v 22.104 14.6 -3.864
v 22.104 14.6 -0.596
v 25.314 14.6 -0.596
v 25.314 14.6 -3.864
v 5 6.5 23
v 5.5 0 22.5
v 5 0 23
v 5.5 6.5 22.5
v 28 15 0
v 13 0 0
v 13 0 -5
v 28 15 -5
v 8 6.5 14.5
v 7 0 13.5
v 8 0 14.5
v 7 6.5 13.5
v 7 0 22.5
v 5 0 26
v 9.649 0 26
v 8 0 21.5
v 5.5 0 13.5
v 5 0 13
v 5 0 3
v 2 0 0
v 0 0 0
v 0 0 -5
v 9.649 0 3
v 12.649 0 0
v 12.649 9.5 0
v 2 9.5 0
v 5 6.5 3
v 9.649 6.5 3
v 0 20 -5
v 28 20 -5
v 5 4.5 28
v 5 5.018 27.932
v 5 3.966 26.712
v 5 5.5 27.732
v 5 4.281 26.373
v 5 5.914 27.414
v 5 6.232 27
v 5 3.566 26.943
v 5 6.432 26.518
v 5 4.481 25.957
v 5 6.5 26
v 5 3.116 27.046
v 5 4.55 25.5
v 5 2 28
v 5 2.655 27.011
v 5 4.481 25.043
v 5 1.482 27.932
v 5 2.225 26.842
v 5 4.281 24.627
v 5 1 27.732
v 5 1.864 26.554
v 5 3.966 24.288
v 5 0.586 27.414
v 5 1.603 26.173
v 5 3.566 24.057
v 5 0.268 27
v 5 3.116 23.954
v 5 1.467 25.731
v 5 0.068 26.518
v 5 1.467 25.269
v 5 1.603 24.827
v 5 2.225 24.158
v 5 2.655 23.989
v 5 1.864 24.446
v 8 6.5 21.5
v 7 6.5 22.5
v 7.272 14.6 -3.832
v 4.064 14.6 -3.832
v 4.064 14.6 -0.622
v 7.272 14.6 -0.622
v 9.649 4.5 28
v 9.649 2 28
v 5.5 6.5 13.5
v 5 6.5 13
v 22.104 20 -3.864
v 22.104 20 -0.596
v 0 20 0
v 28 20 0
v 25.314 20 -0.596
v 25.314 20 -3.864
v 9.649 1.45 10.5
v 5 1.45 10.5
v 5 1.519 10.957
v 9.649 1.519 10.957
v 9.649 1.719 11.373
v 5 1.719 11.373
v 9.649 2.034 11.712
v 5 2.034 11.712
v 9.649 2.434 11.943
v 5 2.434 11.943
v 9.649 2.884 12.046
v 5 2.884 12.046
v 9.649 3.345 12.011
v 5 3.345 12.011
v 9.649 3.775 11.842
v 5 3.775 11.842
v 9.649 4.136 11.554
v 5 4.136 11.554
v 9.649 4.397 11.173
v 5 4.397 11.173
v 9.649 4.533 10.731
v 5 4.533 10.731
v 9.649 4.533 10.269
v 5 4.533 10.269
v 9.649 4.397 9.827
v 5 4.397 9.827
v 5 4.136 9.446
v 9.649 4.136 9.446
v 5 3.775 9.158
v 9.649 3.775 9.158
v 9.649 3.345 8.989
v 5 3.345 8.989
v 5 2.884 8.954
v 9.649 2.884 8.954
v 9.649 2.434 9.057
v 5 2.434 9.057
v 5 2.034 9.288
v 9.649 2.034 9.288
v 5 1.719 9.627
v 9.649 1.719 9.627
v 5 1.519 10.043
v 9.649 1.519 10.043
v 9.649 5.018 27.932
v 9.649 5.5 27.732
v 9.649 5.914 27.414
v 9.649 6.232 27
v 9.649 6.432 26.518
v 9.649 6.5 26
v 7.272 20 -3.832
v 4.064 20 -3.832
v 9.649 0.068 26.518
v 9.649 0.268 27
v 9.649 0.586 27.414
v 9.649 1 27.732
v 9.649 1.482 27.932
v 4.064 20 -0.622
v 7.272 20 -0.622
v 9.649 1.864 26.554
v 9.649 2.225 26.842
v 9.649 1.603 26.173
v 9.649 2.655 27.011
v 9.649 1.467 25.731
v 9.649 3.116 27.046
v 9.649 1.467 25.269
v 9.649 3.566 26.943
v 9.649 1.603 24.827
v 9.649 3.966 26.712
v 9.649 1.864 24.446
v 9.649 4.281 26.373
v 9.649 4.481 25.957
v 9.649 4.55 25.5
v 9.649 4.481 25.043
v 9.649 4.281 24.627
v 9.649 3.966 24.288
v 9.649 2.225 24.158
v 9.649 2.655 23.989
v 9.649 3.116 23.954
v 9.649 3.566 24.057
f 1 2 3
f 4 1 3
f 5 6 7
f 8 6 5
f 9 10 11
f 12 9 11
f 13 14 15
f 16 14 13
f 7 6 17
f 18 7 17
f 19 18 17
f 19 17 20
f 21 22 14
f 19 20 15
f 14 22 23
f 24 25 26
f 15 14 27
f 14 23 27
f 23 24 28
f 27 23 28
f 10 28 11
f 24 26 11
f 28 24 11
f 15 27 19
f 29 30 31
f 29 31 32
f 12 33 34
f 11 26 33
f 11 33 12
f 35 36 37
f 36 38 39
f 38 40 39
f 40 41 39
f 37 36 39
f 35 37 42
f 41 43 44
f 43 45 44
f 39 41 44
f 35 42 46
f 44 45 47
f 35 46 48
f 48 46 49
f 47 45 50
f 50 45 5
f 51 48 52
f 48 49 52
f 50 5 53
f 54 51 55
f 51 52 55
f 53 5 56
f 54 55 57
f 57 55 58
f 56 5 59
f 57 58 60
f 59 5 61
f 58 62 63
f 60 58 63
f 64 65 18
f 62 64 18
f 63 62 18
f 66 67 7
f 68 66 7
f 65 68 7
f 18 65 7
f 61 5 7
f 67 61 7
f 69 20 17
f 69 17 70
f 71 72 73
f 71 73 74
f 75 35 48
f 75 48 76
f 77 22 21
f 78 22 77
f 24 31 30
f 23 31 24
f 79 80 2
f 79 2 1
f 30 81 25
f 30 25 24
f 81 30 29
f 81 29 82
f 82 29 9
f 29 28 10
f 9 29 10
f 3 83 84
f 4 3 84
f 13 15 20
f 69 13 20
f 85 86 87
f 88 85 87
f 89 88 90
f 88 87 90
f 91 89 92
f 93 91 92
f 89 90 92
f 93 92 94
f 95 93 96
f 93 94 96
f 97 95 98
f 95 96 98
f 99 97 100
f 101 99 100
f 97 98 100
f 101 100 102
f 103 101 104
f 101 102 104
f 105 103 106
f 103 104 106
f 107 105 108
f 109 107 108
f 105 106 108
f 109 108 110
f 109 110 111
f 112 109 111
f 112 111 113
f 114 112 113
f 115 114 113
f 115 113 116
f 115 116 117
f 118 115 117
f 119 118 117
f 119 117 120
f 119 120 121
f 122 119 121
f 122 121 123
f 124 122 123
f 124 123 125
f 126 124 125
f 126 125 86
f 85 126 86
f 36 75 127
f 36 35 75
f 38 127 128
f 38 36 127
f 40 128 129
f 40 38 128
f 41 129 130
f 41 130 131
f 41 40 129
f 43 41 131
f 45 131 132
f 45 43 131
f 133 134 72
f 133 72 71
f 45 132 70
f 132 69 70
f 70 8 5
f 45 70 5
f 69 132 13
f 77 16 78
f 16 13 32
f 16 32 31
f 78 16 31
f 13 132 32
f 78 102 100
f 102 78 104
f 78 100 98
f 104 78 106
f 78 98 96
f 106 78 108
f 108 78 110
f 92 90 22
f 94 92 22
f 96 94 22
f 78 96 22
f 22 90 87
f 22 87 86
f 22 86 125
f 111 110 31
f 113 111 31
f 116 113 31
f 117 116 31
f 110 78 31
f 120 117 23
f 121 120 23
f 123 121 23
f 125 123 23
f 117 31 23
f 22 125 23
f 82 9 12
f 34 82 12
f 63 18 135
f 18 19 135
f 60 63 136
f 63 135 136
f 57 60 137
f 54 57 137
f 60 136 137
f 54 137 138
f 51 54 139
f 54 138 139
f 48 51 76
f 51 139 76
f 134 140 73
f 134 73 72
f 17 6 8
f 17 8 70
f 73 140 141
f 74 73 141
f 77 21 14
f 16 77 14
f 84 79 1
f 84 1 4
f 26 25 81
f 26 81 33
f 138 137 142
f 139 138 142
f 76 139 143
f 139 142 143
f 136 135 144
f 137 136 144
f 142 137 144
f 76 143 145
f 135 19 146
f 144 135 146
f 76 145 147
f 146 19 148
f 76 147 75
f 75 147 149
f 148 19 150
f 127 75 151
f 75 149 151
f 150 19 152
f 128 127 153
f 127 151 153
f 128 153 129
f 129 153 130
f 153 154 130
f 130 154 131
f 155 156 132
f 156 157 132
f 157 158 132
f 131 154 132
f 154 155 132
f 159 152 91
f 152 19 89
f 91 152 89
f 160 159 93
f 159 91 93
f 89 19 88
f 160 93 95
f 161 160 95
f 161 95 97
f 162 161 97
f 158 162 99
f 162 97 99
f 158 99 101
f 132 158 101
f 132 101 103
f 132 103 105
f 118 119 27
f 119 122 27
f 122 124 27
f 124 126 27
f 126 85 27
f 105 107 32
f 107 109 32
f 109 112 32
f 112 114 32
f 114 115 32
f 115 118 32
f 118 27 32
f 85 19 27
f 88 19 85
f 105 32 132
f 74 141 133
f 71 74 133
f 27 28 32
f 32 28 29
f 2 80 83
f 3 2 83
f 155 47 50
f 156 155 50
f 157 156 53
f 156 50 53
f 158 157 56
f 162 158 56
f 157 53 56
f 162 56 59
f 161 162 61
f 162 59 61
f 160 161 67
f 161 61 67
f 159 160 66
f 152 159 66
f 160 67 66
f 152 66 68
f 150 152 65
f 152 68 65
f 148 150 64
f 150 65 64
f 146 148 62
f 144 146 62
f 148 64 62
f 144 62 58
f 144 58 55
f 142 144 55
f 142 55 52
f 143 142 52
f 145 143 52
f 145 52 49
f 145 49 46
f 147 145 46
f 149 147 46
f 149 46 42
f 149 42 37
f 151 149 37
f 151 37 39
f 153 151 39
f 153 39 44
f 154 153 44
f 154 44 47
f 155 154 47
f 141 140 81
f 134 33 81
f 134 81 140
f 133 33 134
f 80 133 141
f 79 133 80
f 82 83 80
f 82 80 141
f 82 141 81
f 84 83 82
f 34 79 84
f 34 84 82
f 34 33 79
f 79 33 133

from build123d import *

# Parameters (mm, degrees)
SKETCH1_W           = 28
SKETCH1_H           = 5
BOSS_EXTRUDE1_DEPTH = 20
CHAMFER1_SIZE       = 15
BOSS_EXTRUDE2_DEPTH = 28
SKETCH3_W           = 3
SKETCH3_H           = 9
CUT_EXTRUDE1_DEPTH  = 12.8
CHAMFER2_SIZE       = 1
FILLET1_R           = 2
CHAMFER3_SIZE       = 0.5
CUT_EXTRUDE2_DEPTH  = 12.8
CHAMFER4_SIZE       = 3
CHAMFER5_SIZE       = 3
SKETCH8_W           = 3.20799886
SKETCH8_H           = 3.210000155
SKETCH8_W_2         = 3.209995615
SKETCH8_H_2         = 3.268000248
CUT_EXTRUDE3_DEPTH  = 5.4


with BuildPart() as part:
    # Sketch1 → Boss-Extrude1 (new body)
    with BuildSketch(Plane(origin=(0, 0, 0), x_dir=(1, 0, 0), z_dir=(0, 1, 0))):
        with Locations((14, 2.5)):
            Rectangle(SKETCH1_W, SKETCH1_H)
    extrude(amount=BOSS_EXTRUDE1_DEPTH)

    # Chamfer1
    chamfer1_edges = [part.edges().sort_by_distance(p)[0] for p in [
        (28, 0, -2.5),
    ]]
    chamfer(chamfer1_edges, length=CHAMFER1_SIZE)

    # Sketch2 → Boss-Extrude2 (add)
    with BuildSketch(Plane.XY):
        Polygon((9.648757297, 6.5), (5, 6.5), (5, 2), (5, 0), (9.648757297, 0), align=None)
    extrude(amount=BOSS_EXTRUDE2_DEPTH)

    # Sketch3 → Cut-Extrude1 (cut)
    with BuildSketch(Plane.XZ):
        with Locations((6.5, 18)):
            Rectangle(SKETCH3_W, SKETCH3_H)
    extrude(amount=-CUT_EXTRUDE1_DEPTH, mode=Mode.SUBTRACT)

    # Chamfer2
    chamfer2_edges = [part.edges().sort_by_distance(p)[0] for p in [
        (8, 3.25, 22.5),
        (8, 3.25, 13.5),
    ]]
    chamfer(chamfer2_edges, length=CHAMFER2_SIZE)

    # Fillet1
    fillet1_edges = [part.edges().sort_by_distance(p)[0] for p in [
        (7.324378649, 6.5, 28),
        (7.324378649, 0, 28),
    ]]
    fillet(fillet1_edges, radius=FILLET1_R)

    # Chamfer3
    chamfer3_edges = [part.edges().sort_by_distance(p)[0] for p in [
        (5, 3.25, 13.5),
        (5, 3.25, 22.5),
    ]]
    chamfer(chamfer3_edges, length=CHAMFER3_SIZE)

    # Sketch4 → Cut-Extrude2 (cut)
    with BuildSketch(Plane.ZY.offset(-5)):
        with BuildLine():
            ThreePointArc((25.5, 1.45), (27.05, 3), (25.5, 4.55))
            ThreePointArc((25.5, 4.55), (23.95, 3), (25.5, 1.45))
        make_face()
        with BuildLine():
            ThreePointArc((10.5, 4.55), (8.95, 3), (10.5, 1.45))
            ThreePointArc((10.5, 1.45), (12.05, 3), (10.5, 4.55))
        make_face()
    extrude(amount=-CUT_EXTRUDE2_DEPTH, mode=Mode.SUBTRACT)

    # Chamfer4
    chamfer4_edges = [part.edges().sort_by_distance(p)[0] for p in [
        (5, 3.25, 0),
        (9.648757297, 3.25, 0),
    ]]
    chamfer(chamfer4_edges, length=CHAMFER4_SIZE)

    # Chamfer5
    chamfer5_edges = [part.edges().sort_by_distance(p)[0] for p in [
        (7.324378649, 6.5, 0),
    ]]
    chamfer(chamfer5_edges, length=CHAMFER5_SIZE)

    # Sketch8 → Cut-Extrude3 (cut)
    # profile 1 of 4: a face of its own
    with BuildSketch(Plane(origin=(0, 20, 0), x_dir=(1, 0, 0), z_dir=(0, 1, 0))):
        with Locations((5.668003112, 2.226999903)):
            Rectangle(SKETCH8_W, SKETCH8_H)
        Polygon((7.122002542, 3.68199998), (6.328001618, 3.68199998), (4.214003682, 3.68199998), (4.214003682, 2.801999915), (4.214003682, 2.091999864), (4.214003682, 0.771999825), (4.858002067, 0.771999825), (6.60200417, 0.771999825), (7.122002542, 0.771999825), (7.122002542, 3.48399987), align=None, mode=Mode.SUBTRACT)
    # profile 2 of 4: a face of its own
    with BuildSketch(Plane(origin=(0, 20, 0), x_dir=(1, 0, 0), z_dir=(0, 1, 0))):
        Polygon((7.122002542, 3.68199998), (7.122002542, 3.48399987), (7.122002542, 0.771999825), (6.60200417, 0.771999825), (4.858002067, 0.771999825), (4.214003682, 0.771999825), (4.214003682, 2.091999864), (4.214003682, 2.801999915), (4.214003682, 3.68199998), (6.328001618, 3.68199998), align=None)
    # profile 3 of 4: a face of its own
    with BuildSketch(Plane(origin=(0, 20, 0), x_dir=(1, 0, 0), z_dir=(0, 1, 0))):
        with Locations((23.709002883, 2.229999751)):
            Rectangle(SKETCH8_W_2, SKETCH8_H_2)
        Polygon((22.254005075, 1.15799997), (22.254005075, 1.283999765), (22.254005075, 3.713999875), (25.16400069, 3.713999875), (25.16400069, 0.749999657), (25.16400069, 0.745999627), (24.429999292, 0.745999627), (22.254005075, 0.745999627), align=None, mode=Mode.SUBTRACT)
    # profile 4 of 4: a face of its own
    with BuildSketch(Plane(origin=(0, 20, 0), x_dir=(1, 0, 0), z_dir=(0, 1, 0))):
        Polygon((22.254005075, 3.713999875), (22.254005075, 1.283999765), (22.254005075, 1.15799997), (22.254005075, 0.745999627), (24.429999292, 0.745999627), (25.16400069, 0.745999627), (25.16400069, 0.749999657), (25.16400069, 3.713999875), align=None)
    extrude(amount=-CUT_EXTRUDE3_DEPTH, mode=Mode.SUBTRACT)


solid = part.part
